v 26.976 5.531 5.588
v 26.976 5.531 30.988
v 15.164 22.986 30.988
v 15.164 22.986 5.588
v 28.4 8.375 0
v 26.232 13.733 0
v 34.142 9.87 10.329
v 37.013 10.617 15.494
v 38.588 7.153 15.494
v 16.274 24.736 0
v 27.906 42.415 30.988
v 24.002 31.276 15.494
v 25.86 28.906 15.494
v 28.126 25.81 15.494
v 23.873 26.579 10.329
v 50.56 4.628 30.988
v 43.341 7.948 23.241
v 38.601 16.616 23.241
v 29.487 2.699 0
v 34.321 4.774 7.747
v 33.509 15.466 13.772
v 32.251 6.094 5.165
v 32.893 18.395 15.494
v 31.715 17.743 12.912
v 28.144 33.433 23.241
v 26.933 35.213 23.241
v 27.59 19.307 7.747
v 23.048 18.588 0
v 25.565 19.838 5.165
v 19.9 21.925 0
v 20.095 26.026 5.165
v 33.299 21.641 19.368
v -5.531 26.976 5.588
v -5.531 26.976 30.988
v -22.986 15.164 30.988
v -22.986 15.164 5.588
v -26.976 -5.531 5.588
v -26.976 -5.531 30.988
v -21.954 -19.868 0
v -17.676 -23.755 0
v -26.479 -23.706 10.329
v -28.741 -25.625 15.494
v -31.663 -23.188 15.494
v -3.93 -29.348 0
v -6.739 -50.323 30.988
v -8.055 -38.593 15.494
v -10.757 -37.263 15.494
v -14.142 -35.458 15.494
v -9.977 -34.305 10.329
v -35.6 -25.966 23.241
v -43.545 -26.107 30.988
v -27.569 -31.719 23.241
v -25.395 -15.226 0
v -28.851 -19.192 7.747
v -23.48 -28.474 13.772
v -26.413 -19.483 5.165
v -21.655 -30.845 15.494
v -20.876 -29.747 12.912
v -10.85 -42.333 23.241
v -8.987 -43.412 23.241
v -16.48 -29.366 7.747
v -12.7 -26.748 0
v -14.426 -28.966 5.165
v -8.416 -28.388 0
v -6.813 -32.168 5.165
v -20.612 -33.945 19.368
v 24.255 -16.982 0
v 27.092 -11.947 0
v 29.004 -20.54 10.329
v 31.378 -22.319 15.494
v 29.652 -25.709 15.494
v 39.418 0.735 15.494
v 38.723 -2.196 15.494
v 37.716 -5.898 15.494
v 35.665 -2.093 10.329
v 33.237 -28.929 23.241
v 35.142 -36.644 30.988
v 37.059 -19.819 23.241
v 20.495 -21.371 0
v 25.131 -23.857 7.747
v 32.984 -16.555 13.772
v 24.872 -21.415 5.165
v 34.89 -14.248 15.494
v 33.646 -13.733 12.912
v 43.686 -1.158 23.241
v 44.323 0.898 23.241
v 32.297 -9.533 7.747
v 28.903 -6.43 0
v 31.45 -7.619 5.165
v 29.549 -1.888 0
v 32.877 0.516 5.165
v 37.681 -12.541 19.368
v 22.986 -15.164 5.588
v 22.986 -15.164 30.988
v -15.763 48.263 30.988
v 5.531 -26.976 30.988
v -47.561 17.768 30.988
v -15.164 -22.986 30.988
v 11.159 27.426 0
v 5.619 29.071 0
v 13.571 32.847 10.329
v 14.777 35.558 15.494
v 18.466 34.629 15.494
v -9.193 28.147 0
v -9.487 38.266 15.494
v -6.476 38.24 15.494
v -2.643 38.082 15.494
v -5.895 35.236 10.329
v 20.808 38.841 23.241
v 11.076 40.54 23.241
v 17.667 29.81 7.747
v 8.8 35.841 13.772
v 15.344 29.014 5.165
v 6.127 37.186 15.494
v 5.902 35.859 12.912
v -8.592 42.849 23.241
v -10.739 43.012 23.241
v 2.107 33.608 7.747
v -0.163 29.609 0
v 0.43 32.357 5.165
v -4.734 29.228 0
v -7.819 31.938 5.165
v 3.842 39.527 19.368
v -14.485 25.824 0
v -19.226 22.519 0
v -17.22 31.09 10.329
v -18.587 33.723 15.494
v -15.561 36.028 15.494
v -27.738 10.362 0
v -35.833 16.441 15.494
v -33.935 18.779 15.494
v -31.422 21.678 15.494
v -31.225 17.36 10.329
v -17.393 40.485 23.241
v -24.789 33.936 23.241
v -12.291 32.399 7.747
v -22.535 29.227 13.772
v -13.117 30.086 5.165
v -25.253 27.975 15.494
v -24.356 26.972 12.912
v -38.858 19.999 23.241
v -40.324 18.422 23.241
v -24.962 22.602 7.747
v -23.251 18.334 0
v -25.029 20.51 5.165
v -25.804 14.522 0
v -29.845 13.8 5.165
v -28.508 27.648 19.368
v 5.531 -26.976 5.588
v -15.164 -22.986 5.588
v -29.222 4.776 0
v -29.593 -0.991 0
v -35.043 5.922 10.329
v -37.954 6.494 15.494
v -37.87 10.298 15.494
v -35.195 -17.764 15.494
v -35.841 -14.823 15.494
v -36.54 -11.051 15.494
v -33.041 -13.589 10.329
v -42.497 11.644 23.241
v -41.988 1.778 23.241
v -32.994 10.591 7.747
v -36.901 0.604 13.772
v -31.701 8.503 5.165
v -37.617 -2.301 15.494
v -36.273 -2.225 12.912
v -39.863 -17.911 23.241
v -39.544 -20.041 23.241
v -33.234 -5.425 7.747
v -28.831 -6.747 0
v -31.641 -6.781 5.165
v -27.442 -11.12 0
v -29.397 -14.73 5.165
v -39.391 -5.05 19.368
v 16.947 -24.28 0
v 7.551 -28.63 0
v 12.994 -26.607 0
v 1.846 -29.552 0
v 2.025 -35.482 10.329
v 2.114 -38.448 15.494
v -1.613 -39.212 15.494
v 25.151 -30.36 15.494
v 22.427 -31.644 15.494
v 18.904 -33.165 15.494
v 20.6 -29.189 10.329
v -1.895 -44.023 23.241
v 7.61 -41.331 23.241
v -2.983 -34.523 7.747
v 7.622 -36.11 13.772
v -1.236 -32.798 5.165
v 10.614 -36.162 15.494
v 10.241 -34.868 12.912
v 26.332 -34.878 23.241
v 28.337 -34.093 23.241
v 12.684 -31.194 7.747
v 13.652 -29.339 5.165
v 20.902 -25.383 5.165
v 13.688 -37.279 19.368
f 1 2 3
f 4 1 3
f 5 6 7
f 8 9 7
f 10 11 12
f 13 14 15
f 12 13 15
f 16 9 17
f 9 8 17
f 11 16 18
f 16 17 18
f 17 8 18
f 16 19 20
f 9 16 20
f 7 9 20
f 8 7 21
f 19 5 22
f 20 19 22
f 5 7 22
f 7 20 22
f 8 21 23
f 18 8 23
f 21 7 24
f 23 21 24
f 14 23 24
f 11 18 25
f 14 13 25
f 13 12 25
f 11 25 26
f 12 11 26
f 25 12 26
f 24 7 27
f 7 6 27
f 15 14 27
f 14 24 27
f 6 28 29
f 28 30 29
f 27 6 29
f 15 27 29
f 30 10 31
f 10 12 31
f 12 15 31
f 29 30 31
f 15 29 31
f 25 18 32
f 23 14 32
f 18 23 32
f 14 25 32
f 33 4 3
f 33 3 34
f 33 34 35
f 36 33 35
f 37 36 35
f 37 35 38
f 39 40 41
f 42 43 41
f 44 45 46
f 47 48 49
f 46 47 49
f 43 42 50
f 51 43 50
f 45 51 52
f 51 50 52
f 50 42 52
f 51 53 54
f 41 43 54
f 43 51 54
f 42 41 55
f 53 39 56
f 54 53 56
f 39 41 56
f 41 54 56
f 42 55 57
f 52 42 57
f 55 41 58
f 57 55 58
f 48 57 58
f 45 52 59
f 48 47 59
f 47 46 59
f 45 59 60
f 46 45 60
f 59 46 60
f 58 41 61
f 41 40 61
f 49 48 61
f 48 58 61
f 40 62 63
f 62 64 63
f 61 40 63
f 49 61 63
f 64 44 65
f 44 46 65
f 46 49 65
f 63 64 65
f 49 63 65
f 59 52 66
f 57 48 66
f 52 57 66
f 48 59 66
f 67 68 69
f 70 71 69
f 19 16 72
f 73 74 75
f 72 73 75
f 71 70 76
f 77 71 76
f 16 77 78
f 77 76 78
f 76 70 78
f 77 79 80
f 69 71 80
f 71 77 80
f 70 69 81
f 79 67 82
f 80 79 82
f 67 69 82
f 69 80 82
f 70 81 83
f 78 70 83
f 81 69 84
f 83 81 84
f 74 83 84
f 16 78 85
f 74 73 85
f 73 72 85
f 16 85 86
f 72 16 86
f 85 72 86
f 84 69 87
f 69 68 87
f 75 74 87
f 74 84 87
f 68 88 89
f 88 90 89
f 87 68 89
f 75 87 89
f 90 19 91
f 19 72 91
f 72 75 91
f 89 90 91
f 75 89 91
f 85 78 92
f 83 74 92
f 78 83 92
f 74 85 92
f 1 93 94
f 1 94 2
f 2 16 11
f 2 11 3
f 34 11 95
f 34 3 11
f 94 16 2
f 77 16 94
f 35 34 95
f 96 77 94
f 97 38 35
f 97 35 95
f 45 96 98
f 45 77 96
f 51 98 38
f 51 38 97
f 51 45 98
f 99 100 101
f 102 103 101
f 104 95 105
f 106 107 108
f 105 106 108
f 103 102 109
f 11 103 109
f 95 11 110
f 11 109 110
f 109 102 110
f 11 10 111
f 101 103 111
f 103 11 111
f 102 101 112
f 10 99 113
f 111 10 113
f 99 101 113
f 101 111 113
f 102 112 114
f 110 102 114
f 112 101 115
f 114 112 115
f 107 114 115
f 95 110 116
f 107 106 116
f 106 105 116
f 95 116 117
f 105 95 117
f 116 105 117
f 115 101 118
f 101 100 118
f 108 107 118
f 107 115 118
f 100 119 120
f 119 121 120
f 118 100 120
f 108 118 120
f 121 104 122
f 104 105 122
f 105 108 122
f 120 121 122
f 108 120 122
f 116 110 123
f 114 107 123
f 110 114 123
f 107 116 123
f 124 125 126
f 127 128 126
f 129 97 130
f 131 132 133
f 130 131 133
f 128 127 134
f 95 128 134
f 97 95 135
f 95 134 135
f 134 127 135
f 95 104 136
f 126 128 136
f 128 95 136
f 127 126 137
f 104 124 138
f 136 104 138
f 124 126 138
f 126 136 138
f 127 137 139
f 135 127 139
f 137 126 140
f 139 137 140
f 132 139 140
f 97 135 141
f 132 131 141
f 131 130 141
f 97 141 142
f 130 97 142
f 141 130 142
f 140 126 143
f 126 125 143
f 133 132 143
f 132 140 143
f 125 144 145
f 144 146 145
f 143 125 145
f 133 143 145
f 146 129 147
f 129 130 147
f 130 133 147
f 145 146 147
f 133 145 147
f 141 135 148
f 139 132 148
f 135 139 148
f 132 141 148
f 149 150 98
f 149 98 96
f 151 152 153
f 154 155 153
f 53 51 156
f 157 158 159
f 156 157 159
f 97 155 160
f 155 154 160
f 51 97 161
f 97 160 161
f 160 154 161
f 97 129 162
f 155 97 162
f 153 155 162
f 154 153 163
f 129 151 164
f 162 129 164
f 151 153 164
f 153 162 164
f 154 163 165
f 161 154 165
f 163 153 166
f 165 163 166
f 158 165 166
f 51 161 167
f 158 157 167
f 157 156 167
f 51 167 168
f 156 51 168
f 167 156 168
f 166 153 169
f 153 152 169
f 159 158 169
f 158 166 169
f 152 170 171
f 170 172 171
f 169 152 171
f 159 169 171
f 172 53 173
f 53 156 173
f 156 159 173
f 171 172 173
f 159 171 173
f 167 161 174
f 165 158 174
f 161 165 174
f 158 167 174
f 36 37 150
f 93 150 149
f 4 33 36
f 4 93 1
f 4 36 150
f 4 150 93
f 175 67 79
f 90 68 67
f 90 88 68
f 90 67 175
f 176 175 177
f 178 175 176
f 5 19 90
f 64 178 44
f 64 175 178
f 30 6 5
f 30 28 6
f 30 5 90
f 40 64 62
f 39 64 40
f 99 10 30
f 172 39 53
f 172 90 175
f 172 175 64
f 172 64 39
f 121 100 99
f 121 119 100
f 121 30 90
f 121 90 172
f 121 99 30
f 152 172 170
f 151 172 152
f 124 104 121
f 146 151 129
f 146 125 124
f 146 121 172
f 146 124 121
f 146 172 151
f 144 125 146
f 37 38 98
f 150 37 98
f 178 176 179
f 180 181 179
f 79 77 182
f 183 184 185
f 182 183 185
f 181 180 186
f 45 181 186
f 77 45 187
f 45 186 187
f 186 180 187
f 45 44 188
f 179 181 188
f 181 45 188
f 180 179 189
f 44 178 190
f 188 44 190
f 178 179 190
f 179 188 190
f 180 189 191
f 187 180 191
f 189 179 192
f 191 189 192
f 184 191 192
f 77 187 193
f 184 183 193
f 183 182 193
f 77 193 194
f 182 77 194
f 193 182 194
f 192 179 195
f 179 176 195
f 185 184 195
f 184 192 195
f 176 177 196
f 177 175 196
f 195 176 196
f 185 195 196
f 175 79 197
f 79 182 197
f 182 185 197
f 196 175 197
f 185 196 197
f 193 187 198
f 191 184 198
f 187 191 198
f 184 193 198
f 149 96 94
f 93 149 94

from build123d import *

# Parameters (mm, degrees)
F5_DEPTH = 25.4


# Not quite as in the source:
# - the arcs of a loft's sections are written as splines that run evenly, so that the points pair up as in the source's solid


with BuildPart() as f3:
    # F2 (on offset) → F3 section 0
    with BuildSketch(Plane.XY.offset(30.988)):
        Polygon((50.5604938488, 4.6280257192), (27.9056160827, 42.4153126988), (-15.7627597645, 48.2630041015), (-47.5614560073, 17.7676690299), (-43.5454057997, -26.1070832156), (-6.7387768606, -50.3226693123), (35.1422885006, -36.6442590214), align=None)
    # F0 (on Top) → F3 section 1
    with BuildSketch(Plane.XY):
        with BuildLine():
            add(Edge.make_bspline(
                [(29.4866381099, 2.699042457), (29.2174542384, 5.6398362877), (28.5051117676, 8.5396714595), (26.2570337959, 14.0012700055), (24.7215972806, 16.5623070077), (20.9635606735, 21.1186294397), (18.7414603862, 23.1133088958), (16.2744217872, 24.7364074332)],
                knots=[0, 0, 0, 0, 0.3333333333, 0.3333333333, 0.6666666667, 0.6666666667, 1, 1, 1, 1], degree=3))
            add(Edge.make_bspline(
                [(16.2744217872, 24.7364074332), (13.8073831882, 26.3595059706), (11.096062491, 27.6105918574), (5.424359114, 29.2582247193), (2.4647307492, 29.6545525654), (-3.440643072, 29.557221804), (-6.385603136, 29.0635761411), (-9.192766079, 28.1467530815)],
                knots=[0, 0, 0, 0, 0.3333333333, 0.3333333333, 0.6666666667, 0.6666666667, 1, 1, 1, 1], degree=3))
            add(Edge.make_bspline(
                [(-9.192766079, 28.1467530815), (-11.9999290219, 27.2299300218), (-14.6685481598, 25.8901734333), (-19.4929686175, 22.4831394605), (-21.6481283077, 20.4163151987), (-25.2539724079, 15.7386232925), (-26.7041772543, 13.1283777633), (-27.7376135895, 10.3620195702)],
                knots=[0, 0, 0, 0, 0.3333333333, 0.3333333333, 0.6666666667, 0.6666666667, 1, 1, 1, 1], degree=3))
            add(Edge.make_bspline(
                [(-27.7376135895, 10.3620195702), (-28.7710499246, 7.5956613772), (-29.3874428624, 4.6739263506), (-29.7316933959, -1.2222083845), (-29.4595052076, -4.1958239296), (-28.0505454335, -9.9314795677), (-26.9139612341, -12.6927568405), (-25.3954723229, -15.2255260241)],
                knots=[0, 0, 0, 0, 0.3333333333, 0.3333333333, 0.6666666667, 0.6666666667, 1, 1, 1, 1], degree=3))
            add(Edge.make_bspline(
                [(-25.3954723229, -15.2255260241), (-23.8769834116, -17.7582952077), (-21.976993695, -20.0618826048), (-17.5818466312, -24.0072083875), (-15.0872738217, -25.6484220597), (-9.7244856209, -28.1229757482), (-6.8569834599, -28.9559866583), (-3.9300224239, -29.3479399781)],
                knots=[0, 0, 0, 0, 0.3333333333, 0.3333333333, 0.6666666667, 0.6666666667, 1, 1, 1, 1], degree=3))
            add(Edge.make_bspline(
                [(-3.9300224239, -29.3479399781), (-1.003061388, -29.739893298), (1.9825799737, -29.690684771), (7.8074892511, -28.7142908169), (10.6459824762, -27.7872352464), (15.9243102077, -25.1372975861), (18.3634427166, -23.4147679279), (20.4948145181, -21.3707565397)],
                knots=[0, 0, 0, 0, 0.3333333333, 0.3333333333, 0.6666666667, 0.6666666667, 1, 1, 1, 1], degree=3))
            add(Edge.make_bspline(
                [(20.4948145181, -21.3707565397), (22.6261863196, -19.3267451516), (24.449230485, -16.961795725), (27.3176264836, -11.7989265964), (28.3625968311, -9.0016935363), (29.5817756531, -3.2227216343), (29.7558219815, -0.2417513736), (29.4866381099, 2.699042457)],
                knots=[0, 0, 0, 0, 0.3333333333, 0.3333333333, 0.6666666667, 0.6666666667, 1, 1, 1, 1], degree=3))
        make_face()
    loft(ruled=True)

    # F4 (on face) → F5 (cut)
    with BuildSketch(Plane.XY.offset(30.988)):
        Polygon((26.9755858675, 5.5309937743), (15.1636164888, 22.9856228979), (-5.5309937743, 26.9755858675), (-22.9856228979, 15.1636164888), (-26.9755858675, -5.5309937743), (-15.1636164888, -22.9856228979), (5.5309937743, -26.9755858675), (22.9856228979, -15.1636164888), align=None)
    extrude(amount=-F5_DEPTH, mode=Mode.SUBTRACT)


solid = f3.part
